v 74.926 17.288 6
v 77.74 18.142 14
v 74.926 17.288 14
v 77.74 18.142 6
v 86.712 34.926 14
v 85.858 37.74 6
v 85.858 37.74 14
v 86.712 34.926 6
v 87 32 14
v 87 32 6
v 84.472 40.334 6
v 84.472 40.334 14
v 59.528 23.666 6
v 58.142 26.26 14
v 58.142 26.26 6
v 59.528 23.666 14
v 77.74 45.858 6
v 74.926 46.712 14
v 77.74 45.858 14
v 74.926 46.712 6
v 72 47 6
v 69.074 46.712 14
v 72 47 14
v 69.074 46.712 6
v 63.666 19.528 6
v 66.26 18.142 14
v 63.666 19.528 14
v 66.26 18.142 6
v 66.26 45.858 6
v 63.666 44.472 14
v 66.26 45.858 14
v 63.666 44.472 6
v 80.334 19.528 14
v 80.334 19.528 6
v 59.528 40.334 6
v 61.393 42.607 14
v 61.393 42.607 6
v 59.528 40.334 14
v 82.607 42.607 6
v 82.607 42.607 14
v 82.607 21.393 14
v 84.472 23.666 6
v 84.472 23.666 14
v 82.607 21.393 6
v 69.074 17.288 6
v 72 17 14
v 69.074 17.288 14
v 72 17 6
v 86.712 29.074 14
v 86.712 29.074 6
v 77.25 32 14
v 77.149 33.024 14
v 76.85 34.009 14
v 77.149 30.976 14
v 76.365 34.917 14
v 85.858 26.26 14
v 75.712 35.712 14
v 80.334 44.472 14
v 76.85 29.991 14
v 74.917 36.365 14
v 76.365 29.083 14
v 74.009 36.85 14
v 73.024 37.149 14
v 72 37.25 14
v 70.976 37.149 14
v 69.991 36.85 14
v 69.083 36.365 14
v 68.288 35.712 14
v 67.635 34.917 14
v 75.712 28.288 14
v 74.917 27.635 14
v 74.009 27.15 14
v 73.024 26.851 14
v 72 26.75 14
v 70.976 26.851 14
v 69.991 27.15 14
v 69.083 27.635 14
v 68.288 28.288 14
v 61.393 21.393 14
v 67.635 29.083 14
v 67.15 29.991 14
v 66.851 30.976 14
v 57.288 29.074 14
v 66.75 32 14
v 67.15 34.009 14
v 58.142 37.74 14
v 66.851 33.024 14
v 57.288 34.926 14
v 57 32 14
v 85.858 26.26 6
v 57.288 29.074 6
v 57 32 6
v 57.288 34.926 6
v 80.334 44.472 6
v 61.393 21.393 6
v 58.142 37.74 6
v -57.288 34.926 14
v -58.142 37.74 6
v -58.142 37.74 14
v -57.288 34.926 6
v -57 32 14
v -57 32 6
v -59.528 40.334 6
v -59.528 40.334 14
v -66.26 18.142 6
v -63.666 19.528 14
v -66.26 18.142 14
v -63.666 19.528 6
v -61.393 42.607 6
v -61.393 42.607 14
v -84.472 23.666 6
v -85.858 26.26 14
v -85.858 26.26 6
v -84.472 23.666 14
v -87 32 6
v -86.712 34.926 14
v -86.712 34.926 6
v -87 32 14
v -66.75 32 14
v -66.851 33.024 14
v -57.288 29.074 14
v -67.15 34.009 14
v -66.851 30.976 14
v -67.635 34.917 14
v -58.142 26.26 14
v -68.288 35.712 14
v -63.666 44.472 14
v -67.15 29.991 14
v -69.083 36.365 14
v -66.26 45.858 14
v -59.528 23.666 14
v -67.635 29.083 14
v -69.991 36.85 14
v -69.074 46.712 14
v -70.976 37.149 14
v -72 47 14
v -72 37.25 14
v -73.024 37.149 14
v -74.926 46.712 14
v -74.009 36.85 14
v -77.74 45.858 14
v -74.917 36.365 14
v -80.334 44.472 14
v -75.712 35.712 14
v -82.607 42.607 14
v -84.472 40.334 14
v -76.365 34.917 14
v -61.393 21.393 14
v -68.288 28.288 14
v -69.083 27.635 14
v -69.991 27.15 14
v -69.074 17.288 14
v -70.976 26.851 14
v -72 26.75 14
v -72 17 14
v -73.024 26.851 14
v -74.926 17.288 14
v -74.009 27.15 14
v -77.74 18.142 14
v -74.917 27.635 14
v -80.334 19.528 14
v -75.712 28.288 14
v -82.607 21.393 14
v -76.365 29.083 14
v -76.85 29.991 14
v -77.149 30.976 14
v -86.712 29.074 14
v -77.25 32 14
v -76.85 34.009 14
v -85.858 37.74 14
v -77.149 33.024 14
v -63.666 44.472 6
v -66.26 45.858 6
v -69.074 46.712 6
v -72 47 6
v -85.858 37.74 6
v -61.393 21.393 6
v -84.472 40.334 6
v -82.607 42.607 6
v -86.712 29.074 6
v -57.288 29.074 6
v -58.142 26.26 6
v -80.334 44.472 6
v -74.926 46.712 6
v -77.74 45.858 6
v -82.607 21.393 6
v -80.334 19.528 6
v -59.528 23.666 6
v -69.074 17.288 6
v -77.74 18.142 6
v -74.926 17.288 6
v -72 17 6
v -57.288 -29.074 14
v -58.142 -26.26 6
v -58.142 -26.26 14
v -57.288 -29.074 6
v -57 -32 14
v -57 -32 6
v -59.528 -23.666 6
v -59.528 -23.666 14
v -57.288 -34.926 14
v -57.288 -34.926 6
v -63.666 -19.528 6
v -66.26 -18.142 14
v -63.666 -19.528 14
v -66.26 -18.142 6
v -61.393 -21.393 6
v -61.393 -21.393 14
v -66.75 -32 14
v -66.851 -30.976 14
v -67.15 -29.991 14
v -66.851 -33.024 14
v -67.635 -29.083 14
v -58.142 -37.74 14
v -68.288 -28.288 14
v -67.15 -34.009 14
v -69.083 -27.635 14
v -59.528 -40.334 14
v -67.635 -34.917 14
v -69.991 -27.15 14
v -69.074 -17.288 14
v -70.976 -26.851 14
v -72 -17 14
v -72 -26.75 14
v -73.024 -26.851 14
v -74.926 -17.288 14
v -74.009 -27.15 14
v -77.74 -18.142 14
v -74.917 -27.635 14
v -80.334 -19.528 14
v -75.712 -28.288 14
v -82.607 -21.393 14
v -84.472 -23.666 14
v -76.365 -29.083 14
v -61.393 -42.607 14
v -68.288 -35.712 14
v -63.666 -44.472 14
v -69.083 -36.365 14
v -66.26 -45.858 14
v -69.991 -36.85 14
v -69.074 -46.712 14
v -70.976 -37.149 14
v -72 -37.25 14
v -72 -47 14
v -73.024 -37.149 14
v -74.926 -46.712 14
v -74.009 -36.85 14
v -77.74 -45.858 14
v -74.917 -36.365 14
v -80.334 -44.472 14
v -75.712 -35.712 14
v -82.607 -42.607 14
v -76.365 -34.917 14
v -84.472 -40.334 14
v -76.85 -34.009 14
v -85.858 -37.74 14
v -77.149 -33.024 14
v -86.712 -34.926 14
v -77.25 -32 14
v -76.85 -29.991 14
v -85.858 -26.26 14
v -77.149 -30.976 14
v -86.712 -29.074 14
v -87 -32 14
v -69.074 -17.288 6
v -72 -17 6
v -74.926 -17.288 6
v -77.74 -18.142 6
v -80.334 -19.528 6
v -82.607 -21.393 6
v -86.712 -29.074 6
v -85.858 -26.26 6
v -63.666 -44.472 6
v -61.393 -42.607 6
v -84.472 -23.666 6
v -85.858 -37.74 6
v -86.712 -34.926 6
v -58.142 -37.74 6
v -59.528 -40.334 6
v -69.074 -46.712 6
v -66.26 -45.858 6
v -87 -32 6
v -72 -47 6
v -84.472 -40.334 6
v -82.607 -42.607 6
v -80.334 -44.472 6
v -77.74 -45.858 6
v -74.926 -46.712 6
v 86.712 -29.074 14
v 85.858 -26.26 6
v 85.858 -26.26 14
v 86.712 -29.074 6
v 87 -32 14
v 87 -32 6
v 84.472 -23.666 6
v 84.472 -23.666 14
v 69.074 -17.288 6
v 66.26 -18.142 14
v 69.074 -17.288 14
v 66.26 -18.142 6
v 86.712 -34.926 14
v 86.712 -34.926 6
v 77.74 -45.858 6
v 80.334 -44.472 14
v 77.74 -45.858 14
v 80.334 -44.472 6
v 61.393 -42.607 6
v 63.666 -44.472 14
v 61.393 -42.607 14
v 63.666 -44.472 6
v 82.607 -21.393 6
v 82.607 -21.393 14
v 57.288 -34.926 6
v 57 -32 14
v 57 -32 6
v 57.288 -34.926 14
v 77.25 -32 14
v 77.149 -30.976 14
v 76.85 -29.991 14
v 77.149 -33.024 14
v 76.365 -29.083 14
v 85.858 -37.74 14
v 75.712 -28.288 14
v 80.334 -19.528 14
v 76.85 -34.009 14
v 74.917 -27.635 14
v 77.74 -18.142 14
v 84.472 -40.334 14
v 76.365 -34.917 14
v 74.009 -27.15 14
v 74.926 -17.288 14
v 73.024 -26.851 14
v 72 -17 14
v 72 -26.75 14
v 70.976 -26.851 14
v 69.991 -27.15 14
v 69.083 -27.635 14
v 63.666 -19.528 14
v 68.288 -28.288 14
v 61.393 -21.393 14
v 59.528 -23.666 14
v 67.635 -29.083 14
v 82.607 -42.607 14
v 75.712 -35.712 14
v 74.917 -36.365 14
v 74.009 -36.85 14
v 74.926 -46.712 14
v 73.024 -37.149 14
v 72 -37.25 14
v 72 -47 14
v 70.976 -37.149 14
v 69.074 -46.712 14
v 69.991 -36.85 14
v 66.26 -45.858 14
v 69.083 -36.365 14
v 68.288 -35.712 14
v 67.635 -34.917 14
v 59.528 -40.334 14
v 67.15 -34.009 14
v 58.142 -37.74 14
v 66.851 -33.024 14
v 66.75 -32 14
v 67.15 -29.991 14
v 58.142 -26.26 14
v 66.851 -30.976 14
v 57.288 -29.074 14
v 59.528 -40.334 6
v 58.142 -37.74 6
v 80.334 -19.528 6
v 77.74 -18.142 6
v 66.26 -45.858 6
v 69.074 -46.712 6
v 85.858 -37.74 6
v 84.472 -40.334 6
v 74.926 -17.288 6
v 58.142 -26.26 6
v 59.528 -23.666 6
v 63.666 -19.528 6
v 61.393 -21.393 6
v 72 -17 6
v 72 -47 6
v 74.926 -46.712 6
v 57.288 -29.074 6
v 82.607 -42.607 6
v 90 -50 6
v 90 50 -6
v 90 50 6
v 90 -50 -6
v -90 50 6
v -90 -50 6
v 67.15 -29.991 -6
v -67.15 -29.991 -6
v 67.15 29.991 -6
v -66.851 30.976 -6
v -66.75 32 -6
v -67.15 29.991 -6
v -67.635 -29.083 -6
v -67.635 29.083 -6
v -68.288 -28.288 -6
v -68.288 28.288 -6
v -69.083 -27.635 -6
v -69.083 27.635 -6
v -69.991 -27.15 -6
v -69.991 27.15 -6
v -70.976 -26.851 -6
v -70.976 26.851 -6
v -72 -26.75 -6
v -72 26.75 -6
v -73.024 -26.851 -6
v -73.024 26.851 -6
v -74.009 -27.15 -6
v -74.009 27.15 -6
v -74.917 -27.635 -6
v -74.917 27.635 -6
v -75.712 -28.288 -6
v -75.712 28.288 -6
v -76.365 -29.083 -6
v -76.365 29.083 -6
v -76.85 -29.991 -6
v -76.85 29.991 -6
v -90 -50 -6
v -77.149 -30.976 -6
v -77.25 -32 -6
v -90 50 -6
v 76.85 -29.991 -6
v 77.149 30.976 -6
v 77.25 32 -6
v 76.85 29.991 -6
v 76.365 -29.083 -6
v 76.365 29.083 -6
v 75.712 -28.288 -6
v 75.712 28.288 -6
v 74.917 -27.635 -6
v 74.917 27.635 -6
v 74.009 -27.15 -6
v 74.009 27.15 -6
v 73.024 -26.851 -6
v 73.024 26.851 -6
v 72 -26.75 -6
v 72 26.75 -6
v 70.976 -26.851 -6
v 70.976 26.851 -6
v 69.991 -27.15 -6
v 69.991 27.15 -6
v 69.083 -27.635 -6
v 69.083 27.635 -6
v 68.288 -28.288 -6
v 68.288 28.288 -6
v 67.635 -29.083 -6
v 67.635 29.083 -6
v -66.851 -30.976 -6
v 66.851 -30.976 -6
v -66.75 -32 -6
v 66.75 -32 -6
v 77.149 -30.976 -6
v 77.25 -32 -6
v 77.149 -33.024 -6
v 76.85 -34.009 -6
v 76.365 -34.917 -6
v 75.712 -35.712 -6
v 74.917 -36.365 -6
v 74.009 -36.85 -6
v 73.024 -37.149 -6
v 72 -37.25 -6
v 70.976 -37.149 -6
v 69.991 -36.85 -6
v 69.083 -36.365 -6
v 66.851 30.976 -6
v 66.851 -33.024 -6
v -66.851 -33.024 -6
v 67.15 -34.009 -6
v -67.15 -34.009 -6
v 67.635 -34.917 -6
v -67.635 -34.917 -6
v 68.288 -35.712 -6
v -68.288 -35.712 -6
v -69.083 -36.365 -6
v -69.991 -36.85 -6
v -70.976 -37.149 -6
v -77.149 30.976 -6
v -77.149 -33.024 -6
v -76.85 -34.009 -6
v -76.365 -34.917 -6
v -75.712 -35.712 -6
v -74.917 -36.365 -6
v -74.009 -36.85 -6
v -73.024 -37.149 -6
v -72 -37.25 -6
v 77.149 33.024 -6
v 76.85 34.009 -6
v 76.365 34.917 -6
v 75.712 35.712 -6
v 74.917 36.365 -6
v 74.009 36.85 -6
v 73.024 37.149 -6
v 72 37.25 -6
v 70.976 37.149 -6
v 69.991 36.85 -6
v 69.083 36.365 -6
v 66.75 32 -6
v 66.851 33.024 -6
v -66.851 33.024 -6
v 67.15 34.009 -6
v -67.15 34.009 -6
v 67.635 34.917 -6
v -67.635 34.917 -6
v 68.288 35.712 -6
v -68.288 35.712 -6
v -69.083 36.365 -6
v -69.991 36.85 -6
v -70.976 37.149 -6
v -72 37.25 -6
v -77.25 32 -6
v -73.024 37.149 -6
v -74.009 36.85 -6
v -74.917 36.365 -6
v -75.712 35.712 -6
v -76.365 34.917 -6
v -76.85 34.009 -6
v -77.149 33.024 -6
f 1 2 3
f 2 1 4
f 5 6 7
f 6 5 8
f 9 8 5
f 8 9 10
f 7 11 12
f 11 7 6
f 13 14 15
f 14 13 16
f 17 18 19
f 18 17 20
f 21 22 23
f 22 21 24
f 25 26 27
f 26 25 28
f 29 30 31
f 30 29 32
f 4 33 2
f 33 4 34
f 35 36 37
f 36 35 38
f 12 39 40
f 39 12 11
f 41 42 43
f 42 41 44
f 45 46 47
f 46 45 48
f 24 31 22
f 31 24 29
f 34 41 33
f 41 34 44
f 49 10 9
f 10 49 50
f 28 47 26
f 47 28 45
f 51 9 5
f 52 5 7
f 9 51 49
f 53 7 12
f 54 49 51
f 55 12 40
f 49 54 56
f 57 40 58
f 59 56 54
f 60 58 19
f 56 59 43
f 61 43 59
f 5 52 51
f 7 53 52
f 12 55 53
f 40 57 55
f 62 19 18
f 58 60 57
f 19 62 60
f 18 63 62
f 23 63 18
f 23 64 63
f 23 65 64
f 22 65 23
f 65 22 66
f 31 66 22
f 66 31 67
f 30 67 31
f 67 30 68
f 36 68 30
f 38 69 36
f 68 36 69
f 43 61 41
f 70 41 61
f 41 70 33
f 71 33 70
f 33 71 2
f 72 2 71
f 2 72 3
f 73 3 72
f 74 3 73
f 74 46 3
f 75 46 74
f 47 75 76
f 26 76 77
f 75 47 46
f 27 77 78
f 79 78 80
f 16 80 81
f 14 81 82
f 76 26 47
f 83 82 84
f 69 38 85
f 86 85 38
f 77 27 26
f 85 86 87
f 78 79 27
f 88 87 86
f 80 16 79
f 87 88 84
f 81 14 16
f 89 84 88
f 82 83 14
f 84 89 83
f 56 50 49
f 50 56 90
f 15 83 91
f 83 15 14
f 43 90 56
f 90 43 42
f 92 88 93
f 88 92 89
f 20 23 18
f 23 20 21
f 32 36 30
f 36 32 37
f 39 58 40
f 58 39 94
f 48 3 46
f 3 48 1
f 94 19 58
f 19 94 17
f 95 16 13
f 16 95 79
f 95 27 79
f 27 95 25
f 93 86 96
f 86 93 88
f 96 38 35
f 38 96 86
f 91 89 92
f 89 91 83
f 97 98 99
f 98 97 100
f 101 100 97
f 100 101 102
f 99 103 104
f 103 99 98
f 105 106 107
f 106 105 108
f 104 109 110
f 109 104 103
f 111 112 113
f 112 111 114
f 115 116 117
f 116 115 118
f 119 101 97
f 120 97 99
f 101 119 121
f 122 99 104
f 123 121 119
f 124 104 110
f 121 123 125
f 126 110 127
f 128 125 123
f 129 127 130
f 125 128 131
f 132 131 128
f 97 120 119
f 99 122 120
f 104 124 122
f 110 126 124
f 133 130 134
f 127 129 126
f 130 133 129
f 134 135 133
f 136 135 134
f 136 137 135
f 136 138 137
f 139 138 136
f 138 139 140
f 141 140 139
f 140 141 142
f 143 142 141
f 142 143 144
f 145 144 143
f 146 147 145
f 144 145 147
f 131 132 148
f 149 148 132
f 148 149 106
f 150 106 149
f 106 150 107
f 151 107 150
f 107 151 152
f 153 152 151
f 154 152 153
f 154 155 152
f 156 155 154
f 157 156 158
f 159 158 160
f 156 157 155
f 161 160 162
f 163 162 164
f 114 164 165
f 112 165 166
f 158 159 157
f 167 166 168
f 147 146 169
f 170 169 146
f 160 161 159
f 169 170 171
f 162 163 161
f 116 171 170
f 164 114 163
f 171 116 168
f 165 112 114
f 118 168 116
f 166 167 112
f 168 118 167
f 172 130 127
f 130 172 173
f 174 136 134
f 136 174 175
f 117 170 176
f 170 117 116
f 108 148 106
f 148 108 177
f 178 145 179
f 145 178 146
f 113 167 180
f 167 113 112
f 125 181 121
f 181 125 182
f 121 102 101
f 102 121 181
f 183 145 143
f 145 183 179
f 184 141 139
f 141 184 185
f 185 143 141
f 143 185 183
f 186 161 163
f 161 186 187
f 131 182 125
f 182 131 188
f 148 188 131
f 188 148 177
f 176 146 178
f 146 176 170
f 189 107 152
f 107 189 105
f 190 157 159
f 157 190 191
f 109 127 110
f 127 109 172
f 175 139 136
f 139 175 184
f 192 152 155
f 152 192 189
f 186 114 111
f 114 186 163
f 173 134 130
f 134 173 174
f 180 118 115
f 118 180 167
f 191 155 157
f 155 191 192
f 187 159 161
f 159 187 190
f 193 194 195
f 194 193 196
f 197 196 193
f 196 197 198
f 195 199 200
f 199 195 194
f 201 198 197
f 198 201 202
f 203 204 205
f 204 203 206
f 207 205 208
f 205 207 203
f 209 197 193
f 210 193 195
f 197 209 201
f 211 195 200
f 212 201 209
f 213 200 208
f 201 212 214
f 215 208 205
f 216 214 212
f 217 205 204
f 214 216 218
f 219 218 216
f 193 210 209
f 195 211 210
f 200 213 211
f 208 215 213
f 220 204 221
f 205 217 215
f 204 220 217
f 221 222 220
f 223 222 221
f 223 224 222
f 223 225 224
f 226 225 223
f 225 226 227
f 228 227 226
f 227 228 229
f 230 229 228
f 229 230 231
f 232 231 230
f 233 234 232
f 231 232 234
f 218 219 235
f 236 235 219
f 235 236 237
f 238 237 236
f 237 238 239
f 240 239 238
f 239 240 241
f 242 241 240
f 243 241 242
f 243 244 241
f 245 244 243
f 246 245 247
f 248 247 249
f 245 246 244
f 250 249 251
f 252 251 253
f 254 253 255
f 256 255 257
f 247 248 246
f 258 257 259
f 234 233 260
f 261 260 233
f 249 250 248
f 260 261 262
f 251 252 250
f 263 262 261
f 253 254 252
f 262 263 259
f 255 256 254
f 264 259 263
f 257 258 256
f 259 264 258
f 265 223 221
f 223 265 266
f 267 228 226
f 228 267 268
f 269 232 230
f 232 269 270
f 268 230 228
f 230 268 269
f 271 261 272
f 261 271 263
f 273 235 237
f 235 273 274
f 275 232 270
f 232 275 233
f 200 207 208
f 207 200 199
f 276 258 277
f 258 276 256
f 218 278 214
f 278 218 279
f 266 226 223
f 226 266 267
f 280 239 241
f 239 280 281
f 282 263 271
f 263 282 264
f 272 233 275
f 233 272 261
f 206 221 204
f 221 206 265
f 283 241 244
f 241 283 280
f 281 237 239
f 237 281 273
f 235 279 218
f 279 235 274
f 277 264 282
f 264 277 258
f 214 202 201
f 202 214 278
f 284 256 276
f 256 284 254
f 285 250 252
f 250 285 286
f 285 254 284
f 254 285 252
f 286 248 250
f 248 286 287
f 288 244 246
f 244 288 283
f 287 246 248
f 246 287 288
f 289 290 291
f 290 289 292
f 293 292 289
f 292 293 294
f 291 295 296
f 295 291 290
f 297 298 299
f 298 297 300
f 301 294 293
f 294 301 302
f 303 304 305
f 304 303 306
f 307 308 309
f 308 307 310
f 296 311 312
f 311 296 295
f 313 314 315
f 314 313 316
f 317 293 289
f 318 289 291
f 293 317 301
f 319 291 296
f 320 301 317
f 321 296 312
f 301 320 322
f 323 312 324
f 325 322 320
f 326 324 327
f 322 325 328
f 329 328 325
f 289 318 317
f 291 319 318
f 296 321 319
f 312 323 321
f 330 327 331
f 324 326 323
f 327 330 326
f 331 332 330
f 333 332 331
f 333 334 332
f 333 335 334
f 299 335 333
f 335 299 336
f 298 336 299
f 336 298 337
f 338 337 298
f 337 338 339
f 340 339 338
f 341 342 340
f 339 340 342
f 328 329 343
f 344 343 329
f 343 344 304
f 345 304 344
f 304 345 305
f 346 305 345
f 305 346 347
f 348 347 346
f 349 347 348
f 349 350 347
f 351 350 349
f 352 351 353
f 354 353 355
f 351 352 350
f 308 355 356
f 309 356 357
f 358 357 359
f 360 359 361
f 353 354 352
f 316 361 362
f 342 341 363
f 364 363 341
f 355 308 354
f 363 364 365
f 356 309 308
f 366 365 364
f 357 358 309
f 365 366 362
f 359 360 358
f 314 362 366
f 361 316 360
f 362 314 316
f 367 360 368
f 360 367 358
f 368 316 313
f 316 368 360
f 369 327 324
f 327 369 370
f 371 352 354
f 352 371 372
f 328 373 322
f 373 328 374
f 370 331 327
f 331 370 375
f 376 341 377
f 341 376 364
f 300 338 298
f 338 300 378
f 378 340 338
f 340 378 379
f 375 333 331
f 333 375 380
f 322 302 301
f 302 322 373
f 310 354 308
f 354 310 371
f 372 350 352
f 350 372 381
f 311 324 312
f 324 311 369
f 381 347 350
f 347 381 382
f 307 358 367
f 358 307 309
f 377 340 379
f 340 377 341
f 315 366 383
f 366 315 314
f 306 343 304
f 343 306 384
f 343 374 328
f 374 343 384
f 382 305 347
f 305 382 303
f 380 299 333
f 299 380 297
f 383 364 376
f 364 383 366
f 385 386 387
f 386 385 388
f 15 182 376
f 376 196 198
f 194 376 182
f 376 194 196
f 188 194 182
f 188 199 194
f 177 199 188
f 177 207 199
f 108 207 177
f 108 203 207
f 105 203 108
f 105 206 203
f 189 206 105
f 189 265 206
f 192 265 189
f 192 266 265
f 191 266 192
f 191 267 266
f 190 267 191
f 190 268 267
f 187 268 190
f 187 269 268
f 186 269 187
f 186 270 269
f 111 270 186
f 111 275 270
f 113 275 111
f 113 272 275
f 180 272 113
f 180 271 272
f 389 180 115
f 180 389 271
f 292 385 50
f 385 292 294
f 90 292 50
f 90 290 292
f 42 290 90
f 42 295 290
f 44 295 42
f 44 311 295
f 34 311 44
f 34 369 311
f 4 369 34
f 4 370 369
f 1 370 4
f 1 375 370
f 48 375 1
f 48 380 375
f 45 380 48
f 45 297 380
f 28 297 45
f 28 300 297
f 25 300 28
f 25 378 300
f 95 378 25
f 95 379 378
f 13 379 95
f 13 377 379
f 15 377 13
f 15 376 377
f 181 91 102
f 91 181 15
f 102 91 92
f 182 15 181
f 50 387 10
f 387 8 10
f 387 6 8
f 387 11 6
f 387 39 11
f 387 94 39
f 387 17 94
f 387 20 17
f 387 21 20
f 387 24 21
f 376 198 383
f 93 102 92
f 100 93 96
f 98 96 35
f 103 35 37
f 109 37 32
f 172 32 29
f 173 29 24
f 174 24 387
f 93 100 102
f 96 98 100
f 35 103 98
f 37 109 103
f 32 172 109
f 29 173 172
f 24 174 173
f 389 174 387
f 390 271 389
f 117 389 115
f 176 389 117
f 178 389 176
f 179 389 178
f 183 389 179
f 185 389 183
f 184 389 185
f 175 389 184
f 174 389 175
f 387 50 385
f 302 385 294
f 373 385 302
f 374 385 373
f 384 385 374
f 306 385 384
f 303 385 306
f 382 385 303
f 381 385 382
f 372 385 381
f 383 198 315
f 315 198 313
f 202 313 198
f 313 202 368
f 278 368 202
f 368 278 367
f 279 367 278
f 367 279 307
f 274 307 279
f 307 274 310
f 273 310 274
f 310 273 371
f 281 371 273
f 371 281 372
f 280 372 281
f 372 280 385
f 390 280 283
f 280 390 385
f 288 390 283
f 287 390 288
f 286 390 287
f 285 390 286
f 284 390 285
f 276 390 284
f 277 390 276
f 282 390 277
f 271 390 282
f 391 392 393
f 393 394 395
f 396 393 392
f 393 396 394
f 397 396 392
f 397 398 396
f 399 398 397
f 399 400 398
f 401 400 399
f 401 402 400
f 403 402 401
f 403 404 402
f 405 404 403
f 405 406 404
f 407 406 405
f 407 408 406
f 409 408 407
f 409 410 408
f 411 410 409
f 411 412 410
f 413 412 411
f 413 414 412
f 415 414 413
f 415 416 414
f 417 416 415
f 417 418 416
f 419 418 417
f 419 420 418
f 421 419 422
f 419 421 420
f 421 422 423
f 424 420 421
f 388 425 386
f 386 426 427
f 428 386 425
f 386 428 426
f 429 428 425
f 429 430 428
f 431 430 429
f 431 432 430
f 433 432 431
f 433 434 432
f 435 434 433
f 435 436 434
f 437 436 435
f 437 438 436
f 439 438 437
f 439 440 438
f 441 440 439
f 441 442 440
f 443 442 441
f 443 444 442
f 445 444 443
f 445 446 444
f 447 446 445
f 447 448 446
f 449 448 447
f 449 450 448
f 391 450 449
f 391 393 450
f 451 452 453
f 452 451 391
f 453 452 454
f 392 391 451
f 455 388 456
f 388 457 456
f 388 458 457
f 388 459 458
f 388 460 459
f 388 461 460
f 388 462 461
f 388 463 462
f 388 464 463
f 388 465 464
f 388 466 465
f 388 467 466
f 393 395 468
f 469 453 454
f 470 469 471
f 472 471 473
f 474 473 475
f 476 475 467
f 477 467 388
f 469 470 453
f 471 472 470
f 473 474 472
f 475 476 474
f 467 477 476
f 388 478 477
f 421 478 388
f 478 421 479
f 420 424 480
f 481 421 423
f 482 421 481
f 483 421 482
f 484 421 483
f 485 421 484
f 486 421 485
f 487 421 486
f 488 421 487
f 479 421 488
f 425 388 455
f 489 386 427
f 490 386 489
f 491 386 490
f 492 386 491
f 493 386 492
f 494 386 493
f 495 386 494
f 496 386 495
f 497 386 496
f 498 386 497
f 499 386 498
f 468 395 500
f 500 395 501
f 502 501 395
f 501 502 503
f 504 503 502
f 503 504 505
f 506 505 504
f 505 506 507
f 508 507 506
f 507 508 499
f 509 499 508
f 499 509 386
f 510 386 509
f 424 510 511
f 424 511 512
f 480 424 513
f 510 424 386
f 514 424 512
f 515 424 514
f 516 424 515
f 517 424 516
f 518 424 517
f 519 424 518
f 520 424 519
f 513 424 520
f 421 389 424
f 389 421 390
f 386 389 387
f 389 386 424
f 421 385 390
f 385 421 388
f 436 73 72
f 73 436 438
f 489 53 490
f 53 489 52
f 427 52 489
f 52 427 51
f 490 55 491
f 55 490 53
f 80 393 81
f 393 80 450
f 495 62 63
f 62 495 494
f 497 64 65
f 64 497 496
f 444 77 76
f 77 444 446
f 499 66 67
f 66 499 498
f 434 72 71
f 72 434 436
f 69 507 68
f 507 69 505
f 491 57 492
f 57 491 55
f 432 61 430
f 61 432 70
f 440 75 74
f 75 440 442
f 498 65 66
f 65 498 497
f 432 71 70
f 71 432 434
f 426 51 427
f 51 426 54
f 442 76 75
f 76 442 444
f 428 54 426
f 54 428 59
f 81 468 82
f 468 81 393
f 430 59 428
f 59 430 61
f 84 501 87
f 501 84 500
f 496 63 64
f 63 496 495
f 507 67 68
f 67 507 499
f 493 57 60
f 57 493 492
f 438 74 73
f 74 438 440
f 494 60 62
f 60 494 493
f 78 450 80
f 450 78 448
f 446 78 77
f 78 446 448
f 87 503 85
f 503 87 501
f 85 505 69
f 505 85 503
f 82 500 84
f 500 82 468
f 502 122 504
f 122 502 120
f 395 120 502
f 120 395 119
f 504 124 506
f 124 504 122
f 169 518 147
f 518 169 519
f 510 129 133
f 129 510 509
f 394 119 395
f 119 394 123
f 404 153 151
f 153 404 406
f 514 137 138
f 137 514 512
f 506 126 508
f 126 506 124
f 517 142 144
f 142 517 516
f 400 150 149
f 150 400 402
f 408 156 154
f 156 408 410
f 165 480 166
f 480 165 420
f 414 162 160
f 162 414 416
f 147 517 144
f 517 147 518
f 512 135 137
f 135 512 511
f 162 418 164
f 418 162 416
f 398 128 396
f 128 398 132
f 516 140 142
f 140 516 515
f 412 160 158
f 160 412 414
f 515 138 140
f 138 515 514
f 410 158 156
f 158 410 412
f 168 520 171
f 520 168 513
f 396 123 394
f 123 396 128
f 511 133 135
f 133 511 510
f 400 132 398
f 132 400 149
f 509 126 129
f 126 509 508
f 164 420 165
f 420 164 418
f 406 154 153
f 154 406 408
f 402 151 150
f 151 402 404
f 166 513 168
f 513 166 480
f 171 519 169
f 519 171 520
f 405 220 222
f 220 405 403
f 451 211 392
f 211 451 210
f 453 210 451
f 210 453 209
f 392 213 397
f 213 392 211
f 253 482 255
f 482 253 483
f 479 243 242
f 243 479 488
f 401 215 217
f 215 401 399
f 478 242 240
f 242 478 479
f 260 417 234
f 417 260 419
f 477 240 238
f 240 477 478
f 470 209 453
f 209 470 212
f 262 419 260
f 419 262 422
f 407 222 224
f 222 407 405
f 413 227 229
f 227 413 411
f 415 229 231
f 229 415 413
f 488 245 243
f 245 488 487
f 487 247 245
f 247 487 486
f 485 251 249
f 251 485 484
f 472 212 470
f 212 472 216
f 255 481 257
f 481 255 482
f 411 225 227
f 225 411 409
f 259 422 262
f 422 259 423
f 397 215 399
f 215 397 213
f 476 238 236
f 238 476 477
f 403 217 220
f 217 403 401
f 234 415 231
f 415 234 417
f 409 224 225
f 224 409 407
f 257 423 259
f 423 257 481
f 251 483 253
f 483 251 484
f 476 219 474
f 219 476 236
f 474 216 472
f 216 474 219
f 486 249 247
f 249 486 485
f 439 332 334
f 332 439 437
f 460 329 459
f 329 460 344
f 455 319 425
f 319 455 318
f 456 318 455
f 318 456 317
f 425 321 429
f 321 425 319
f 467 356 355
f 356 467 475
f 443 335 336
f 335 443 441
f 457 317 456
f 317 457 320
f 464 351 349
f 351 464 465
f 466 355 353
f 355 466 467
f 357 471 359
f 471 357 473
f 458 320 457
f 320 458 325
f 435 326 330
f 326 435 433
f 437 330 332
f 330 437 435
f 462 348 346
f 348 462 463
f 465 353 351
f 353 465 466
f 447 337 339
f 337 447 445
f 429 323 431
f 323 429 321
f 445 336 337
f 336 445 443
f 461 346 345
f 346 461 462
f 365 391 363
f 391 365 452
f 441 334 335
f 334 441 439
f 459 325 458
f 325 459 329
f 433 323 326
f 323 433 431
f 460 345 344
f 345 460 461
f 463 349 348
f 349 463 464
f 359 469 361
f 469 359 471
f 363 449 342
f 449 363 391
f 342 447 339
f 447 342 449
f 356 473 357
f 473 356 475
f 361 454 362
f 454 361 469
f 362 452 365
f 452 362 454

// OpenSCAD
$fn = 32;

// ----------------------------------------------------------------------
// Anchor pads 180 x 100 x 20
// four corner bosses with anchor holes
// ----------------------------------------------------------------------

// --- parameters (mm) ---
plate = [180, 100, 12];  // base plate size (x, y, z)
pads = 4;                // boss count, one per corner
edge = 18;               // boss centre offset from the plate edge
boss_d = 30;             // boss diameter
boss_h = 8;              // boss height above the base plate
hole_d = 10.5;           // hole diameter

// --- derived feature positions (mm) ---
height = plate[2] + boss_h;      // = 20   overall height of the part
corner_x = plate[0] / 2 - edge;  // = 72   boss centre X
corner_y = plate[1] / 2 - edge;  // = 32   boss centre Y
feature_centers = [
  [corner_x, corner_y],
  [-corner_x, corner_y],
  [-corner_x, -corner_y],
  [corner_x, -corner_y]
];   // boss centres, anchor holes are drilled there

// base plate, four bosses standing on it, anchor holes all the way through
difference() {
  union() {
    cube(plate, center = true);
    for (centre = feature_centers)
      translate([centre[0], centre[1], plate[2] / 2 - 1])
        cylinder(d = boss_d, h = boss_h + 1);
  }
  for (centre = feature_centers)
    translate([centre[0], centre[1], -height])
      cylinder(d = hole_d, h = 2 * height + 2);  // through boss and plate
}
